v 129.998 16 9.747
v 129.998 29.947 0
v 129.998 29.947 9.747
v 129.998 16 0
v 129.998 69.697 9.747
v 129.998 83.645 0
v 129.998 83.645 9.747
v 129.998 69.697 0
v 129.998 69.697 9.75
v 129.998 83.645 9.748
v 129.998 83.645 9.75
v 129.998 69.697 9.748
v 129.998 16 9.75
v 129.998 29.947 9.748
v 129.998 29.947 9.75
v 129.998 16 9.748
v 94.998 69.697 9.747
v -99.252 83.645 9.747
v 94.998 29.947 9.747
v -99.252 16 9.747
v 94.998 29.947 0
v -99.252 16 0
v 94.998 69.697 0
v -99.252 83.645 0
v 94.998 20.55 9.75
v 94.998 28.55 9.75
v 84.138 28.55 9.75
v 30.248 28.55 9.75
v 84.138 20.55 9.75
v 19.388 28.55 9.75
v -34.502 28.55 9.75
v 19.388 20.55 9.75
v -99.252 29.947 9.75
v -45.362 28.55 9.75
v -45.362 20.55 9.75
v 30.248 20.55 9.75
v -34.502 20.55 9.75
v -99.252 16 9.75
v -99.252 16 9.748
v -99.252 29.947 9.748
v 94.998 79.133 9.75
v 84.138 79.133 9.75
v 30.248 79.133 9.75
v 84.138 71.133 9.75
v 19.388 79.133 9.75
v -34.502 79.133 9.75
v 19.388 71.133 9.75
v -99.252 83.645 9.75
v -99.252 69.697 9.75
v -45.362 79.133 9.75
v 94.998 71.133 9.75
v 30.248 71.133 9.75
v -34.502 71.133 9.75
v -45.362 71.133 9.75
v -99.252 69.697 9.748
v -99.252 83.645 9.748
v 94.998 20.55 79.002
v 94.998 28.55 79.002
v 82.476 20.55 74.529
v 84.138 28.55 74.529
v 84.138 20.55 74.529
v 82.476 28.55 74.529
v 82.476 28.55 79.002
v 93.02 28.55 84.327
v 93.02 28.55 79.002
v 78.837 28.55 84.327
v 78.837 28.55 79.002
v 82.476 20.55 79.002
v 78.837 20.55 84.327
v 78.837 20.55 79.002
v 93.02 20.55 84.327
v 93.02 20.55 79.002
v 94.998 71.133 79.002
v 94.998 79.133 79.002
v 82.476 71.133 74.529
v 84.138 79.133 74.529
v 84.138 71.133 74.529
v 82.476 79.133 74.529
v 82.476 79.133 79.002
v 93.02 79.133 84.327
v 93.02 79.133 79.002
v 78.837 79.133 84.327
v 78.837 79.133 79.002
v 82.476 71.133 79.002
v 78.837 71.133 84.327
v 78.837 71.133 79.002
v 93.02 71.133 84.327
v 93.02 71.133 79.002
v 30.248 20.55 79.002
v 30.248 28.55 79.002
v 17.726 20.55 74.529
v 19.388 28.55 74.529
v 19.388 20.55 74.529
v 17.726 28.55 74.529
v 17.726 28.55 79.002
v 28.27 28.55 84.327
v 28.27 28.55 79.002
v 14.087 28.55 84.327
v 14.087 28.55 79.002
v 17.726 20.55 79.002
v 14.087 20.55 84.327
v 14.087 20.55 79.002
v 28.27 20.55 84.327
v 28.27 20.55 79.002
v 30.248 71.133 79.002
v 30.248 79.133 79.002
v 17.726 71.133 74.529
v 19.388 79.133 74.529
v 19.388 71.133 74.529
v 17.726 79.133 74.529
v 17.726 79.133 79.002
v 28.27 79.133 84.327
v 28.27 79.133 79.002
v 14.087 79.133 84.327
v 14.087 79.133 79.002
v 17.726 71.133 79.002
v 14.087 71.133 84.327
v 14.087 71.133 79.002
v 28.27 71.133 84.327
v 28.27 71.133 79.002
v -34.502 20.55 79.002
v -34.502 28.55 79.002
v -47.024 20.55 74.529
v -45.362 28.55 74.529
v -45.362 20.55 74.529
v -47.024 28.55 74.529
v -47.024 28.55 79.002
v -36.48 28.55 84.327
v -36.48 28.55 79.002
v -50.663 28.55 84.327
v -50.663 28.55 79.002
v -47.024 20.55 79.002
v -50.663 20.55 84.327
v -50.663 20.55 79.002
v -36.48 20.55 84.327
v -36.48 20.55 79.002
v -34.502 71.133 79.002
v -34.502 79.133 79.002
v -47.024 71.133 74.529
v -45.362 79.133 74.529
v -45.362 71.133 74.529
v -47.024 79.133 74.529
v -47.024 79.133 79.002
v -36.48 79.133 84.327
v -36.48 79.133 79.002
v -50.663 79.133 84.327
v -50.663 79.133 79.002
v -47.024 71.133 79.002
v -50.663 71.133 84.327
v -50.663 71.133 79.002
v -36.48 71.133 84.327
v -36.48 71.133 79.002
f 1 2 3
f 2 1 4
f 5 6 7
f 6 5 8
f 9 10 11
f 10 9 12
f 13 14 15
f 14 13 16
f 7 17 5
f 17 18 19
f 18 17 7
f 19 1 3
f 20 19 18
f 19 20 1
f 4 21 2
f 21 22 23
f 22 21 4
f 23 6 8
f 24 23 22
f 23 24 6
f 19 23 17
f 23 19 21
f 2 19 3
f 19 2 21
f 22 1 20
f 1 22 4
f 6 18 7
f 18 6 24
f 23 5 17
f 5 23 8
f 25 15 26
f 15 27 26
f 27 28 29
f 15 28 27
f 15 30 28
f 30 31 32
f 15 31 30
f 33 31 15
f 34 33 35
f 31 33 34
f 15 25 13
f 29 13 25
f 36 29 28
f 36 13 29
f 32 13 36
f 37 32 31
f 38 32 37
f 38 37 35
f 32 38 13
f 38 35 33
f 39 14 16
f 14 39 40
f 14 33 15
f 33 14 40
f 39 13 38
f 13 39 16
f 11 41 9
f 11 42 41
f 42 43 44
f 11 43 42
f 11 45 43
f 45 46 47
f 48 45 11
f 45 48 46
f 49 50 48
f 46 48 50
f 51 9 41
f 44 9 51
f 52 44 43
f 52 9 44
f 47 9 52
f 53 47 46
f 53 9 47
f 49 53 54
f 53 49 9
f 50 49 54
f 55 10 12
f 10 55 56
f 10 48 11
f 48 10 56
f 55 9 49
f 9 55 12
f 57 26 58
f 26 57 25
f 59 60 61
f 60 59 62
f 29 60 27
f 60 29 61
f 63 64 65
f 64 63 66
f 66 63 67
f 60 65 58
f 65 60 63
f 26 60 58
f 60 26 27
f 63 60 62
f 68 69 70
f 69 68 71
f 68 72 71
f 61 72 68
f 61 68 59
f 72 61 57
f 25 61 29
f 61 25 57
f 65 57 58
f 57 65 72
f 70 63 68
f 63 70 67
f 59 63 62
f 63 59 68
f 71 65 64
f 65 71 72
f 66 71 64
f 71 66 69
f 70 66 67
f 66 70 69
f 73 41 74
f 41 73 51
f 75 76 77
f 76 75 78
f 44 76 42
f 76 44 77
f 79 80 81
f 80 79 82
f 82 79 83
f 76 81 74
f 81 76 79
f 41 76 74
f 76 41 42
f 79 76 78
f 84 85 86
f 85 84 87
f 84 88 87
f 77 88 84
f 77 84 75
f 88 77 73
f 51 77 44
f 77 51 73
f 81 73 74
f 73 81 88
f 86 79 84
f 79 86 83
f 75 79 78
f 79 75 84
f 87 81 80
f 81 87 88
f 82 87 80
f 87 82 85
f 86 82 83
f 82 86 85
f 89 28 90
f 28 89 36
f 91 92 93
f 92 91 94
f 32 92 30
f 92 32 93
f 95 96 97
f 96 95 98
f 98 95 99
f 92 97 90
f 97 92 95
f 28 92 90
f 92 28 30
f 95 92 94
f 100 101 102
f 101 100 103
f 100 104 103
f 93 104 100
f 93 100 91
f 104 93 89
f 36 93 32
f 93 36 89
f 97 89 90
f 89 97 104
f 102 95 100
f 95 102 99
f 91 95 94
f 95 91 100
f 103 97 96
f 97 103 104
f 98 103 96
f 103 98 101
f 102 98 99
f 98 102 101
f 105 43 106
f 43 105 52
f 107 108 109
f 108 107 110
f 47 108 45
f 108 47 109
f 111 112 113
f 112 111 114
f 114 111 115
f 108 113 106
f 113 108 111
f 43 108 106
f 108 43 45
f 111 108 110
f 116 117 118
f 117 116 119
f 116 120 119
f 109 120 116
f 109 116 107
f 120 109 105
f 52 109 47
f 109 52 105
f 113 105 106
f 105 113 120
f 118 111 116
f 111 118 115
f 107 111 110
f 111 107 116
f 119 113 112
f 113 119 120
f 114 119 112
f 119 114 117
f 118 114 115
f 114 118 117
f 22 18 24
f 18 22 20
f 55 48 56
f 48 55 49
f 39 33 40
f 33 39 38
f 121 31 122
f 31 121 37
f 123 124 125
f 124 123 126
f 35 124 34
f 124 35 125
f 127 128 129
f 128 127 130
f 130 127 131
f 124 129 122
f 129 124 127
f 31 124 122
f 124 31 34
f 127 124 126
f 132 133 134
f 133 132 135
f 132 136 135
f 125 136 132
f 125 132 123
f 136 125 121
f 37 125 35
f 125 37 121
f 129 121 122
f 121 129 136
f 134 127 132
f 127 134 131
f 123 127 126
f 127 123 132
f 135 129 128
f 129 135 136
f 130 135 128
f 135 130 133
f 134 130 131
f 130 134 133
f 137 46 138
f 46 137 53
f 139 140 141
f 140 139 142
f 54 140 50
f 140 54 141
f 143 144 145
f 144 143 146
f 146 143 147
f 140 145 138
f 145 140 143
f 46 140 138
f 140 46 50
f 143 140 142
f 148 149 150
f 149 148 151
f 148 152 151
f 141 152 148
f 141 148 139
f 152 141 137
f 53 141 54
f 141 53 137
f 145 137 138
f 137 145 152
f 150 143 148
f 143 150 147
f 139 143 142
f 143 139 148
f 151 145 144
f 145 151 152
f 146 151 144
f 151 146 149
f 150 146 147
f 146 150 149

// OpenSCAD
// Parameterized version of top_rect_cubes_simplified_jay.scad
// Parameters (edit these):
//   width:    overall X width (right side shifts)
//   length:   overall Y depth (scales from front face)
//   arm_gap:  gap in Y between the two arms (overrides the scaled gap)
//
// Knob-centering behavior:
// - Features in the mid-band (the small "knobs" on the large planes) stay centered
//   between the arms when arm_gap changes (they shift by half the gap delta).
//
// Identity check (matches the source geometry exactly) when:
//   width  = 252.997994;
//   length = 59.644998;
//   arm_gap = 31.750000;


pair_spacing = 64.750000;   // X spacing between tower *pairs* (right-edge to right-edge)
tower_width  = 10.860001;    // X width of a tower (main body width at the base)
tower_length = 8; // Y length of a tower
tower_height = 74.577000;   // Overall Z height of a tower (from z=9.75 to the top)
tower_y_offset = 4.55;


width   = 252.997994;
length  = 59.644998;
arm_gap = 39.750000;

// --- Reference constants (from source file) ---
_x_min      = -123.000008;
_x_split    = 94.997986;
_width_orig = 252.997994;

// Y reference landmarks (original)
// front arm ends at _y_front_end, back arm starts at _y_back_start.
// mid-band corresponds to the small "knobs" on the large planes.
_y_min           = 15.999999;
_y_front_end     = 29.946999;
_y_mid_band_start = 42.919998;
_y_mid_band_end   = 48.919998;
_y_back_start    = 61.696999;
_y_max           = 75.644997;
_length_orig     = 59.644998;
_arm_gap_orig    = 31.750000;

// --- Mapping functions ---
// X: shift the right side to hit the desired width
function map_x(x) = (x < _x_split) ? x : (x + (width - _width_orig));

// Y: first scale overall length from the front face, then shift the back-arm region
// to achieve the requested arm_gap. Mid-band features shift by half the gap delta.
function scale_y(y) = _y_min + (y - _y_min) * (length / _length_orig);

function _front_end_s() = scale_y(_y_front_end);
function _back_start_s() = scale_y(_y_back_start);
function _mid_start_s() = scale_y(_y_mid_band_start);
function _mid_end_s()   = scale_y(_y_mid_band_end);

function _gap_scaled() = _back_start_s() - _front_end_s();
function _gap_delta()  = arm_gap - _gap_scaled();

function map_y(y) =
  let(
    y0 = scale_y(y),
    bs = _back_start_s(),
    ms = _mid_start_s(),
    me = _mid_end_s(),
    dg = _gap_delta()
  )
  (y0 < bs)
    ? ((y0 >= ms && y0 <= me) ? (y0 + dg/2) : y0)
    : (y0 + dg);

module rect_prism_m(x1,y1,x2,y2,z0,h){
  translate([map_x(x1), map_y(y1), z0])
    cube([map_x(x2)-map_x(x1), map_y(y2)-map_y(y1), h], center=false);
}

// --- Tower parameterization helpers ---
// The original towers are made from 3 stacked prisms. We build the raw geometry
// in "original coordinates" (pre map_x/map_y), then scale it to match the user
// parameters while keeping the tower's right edge, front/back start, and base Z fixed.

_tower_z0_orig = 9.750000;
_tower_h_orig  = 74.577000;  // (79.001600+5.325400) - 9.750000

_tower_main_w_orig = 8.860001; // 94.997986 - 86.137985

_tower_front_y0_orig = 15.999999;
_tower_front_len_orig = 13.919999; // 29.919998 - 15.999999

_tower_back_y0_orig = 61.919998;
_tower_back_len_orig = 13.724999;  // 75.644997 - 61.919998

// X offsets from a tower's right edge (x_right) that define the 3 stacked prisms
_tower_main_dx0 = _tower_main_w_orig;         // main: x_right - dx0 .. x_right
_tower_mid_dx0  = 10.215522;                  // mid:  x_right - dx0 .. x_right
_tower_top_dx0  = 13.185022;                  // top:  x_right - dx0 .. (x_right - dx1)
_tower_top_dx1  = 1.613744;

module _tower_raw(x_right, y0, y_len) {
  union() {
    // main body
    rect_prism_m(x_right - _tower_main_dx0, y0, x_right, y0 + y_len, _tower_z0_orig, 64.779);
    // mid cap
    rect_prism_m(x_right - _tower_mid_dx0,  y0, x_right, y0 + y_len, 74.529000, 4.4726);
    // top cap (slightly inset on the right)
    rect_prism_m(x_right - _tower_top_dx0,  y0, x_right - _tower_top_dx1, y0 + y_len, 79.001600, 5.3254);
  }
}

module tower_scaled(x_right, y0, y_len_orig, y_len_target) {
  // Scale about (x_right, y0, _tower_z0_orig) so the tower stays "attached"
  // to the same base and its right edge stays aligned.
  sx = tower_width / _tower_main_w_orig;
  sy = y_len_target / y_len_orig;
  sz = tower_height / _tower_h_orig;

  translate([x_right, tower_y_offset + y0, _tower_z0_orig])
    scale([sx, sy, sz])
      translate([-x_right, -y0, -_tower_z0_orig])
        _tower_raw(x_right, y0, y_len_orig);
}

module tower_pair(x_right) {
  tower_scaled(x_right, _tower_front_y0_orig, _tower_front_len_orig, tower_length);
  tower_scaled(x_right, _tower_back_y0_orig,  _tower_back_len_orig,  tower_length);
}



// --- Section controls ---
// Four section templates exist (0..3). Each template is a left-to-right slice of the design
// and contains *two towers* (front + back) plus its mid-band features.
//
// To remove/reorder/repeat sections, edit these:
section_sequence = [0,1,2,3,4];           // templates per slot: 0=base-only, 1=rightmost towers, ..., 4=leftmost towers
section_show     = [true,true,true,true,false]; // per-slot visibility (same length as section_sequence)

_section_centers = [-73.682014, -18.932015, 35.817985, 90.567986];
_section_pitch_orig = 54.750000;
_section_pitch = pair_spacing;

function slot_center(slot) = _section_centers[0] + slot*_section_pitch;
function template_center(idx) = _section_centers[idx];

module section_by_index(idx) {
  if (idx==0) section_0();
  else if (idx==1) section_1();
  else if (idx==2) section_2();
  else if (idx==3) section_3();
  else assert(false, str("Invalid section index: ", idx));
}

module place_section(slot, idx) {
  // Translate template idx into slot position so spacing stays consistent
  translate([slot_center(slot) - template_center(idx), 0, 0]) section_by_index(idx);
}

module sections() {
  // Base segments are defined by the right edges of the tower pairs, plus the overall base bounds.
  // Sections (slots) run from the RIGHT side toward the LEFT:
  //   slot 0: base_x_max -> right edge of rightmost towers (no towers by default)
  //   slot 1: rightmost tower edge -> next tower edge
  //   slot 2: next -> next
  //   slot 3: next -> next
  //   slot 4: leftmost tower edge -> base_x_min
  //
  // Template ids (section_sequence):
  //   0 = base-only (no towers)
  //   1 = section_3 (rightmost towers)
  //   2 = section_2
  //   3 = section_1
  //   4 = section_0 (leftmost towers)

  for (slot = [0 : len(section_sequence)-1]) {
    if (slot < len(section_show) && section_show[slot]) {
      // Base under this section
      base_segment_for_slot(slot);

      // Section content (towers/knobs/etc) for this slot
      translate([template_shift_x(section_sequence[slot]), 0, 0]) place_template(section_sequence[slot]);
    }
  }
}

// --- Base segment clipping (per slot) ---
_base_x_max_orig = 129.997986;
_base_x_min_orig = -123.000008;
// Right edges of each tower-pair.
// Keep the *template* geometry at the original pitch, then move whole templates
// by template_shift_x() so changing pair_spacing doesn't double-apply.
_tower_right_edge0_orig = 94.997986;
_tower_right_edges_template = [
  _tower_right_edge0_orig,
  _tower_right_edge0_orig - 1*_section_pitch_orig,
  _tower_right_edge0_orig - 2*_section_pitch_orig,
  _tower_right_edge0_orig - 3*_section_pitch_orig
];

// Actual (placed) right-edges after spacing adjustment.
function tower_right_edge_placed(i) = _tower_right_edge0_orig - i*pair_spacing;

// Compute how far left the towers extend (so the base can stretch under them).
_tower_dx_max_orig = _tower_top_dx0; // widest left overhang in the source tower stack
function _tower_dx_max_scaled() = _tower_dx_max_orig * (tower_width / _tower_main_w_orig);
function _base_x_min_dyn() =
  min(
    _base_x_min_orig,
    min([ for (i=[0:3]) tower_right_edge_placed(i) - _tower_dx_max_scaled() ])
  );

function slot_x_hi_orig(slot) =
  (slot == 0) ? _base_x_max_orig :
  (slot == 1) ? tower_right_edge_placed(0) :
  (slot == 2) ? tower_right_edge_placed(1) :
  (slot == 3) ? tower_right_edge_placed(2) :
  (slot == 4) ? tower_right_edge_placed(3) :
  _base_x_min_dyn();

function slot_x_lo_orig(slot) =
  (slot == 0) ? tower_right_edge_placed(0) :
  (slot == 1) ? tower_right_edge_placed(1) :
  (slot == 2) ? tower_right_edge_placed(2) :
  (slot == 3) ? tower_right_edge_placed(3) :
  (slot == 4) ? _base_x_min_dyn() :
  _base_x_min_dyn();

module base_segment_for_slot(slot) {
  // Clip the common base planes into the slot's X-range.
  // Use mapped X coordinates so width parameterization stays consistent.
  x_hi = map_x(slot_x_hi_orig(slot));
  x_lo = map_x(slot_x_lo_orig(slot));
  x0 = min(x_lo, x_hi);
  x1 = max(x_lo, x_hi);
  w  = max(0.001, x1 - x0);

  intersection() {
    base_planes();
    // Big clip box in Y/Z; base is near y~[16..76], z~[0..~20], so this safely covers it.
    translate([x0, -1000, -1000]) cube([w, 2000, 2000], center=false);
  }
}


// --- X spacing adjustment for tower pairs ---
// pair_spacing changes the X distance between tower pairs. The rightmost pair stays fixed;
// pairs to the left shift by multiples of (pair_spacing - _section_pitch_orig).
function pair_index_from_tid(tid) =
  (tid == 1) ? 0 :
  (tid == 2) ? 1 :
  (tid == 3) ? 2 :
  (tid == 4) ? 3 :
  0;

function template_shift_x(tid) =
  -pair_index_from_tid(tid) * (pair_spacing - _section_pitch_orig);


// --- Template dispatcher ---
module place_template(tid) {
  if (tid == 0) {
    // base-only
  } else if (tid == 1) {
    section_3();
  } else if (tid == 2) {
    section_2();
  } else if (tid == 3) {
    section_1();
  } else if (tid == 4) {
    section_0();
  } else {
    // Unknown template id: render nothing
  }
}


// --- Base planes (common to all sections) ---
module base_planes() {
  bxmin = _base_x_min_dyn();
  union() {
    rect_prism_m(94.997986,15.999999,129.997986,29.946999,0.000000,9.747);
    // Main slab stretches in X so it always stays under the (moved) towers.
    rect_prism_m(bxmin,15.999999,94.997986,75.644997,0.000000,9.747);
    rect_prism_m(94.997986,61.696999,129.997986,75.644997,0.000000,9.747);
    rect_prism_m(bxmin,15.999999,129.997986,29.946999,9.748000,0.002);
    rect_prism_m(bxmin,61.696999,129.997986,75.644997,9.748000,0.002);
  }
}

module section_0() {
  tower_pair(_tower_right_edges_template[3]);
}

module section_1() {
  tower_pair(_tower_right_edges_template[2]);
}

module section_2() {
  tower_pair(_tower_right_edges_template[1]);
}

module section_3() {
  tower_pair(_tower_right_edges_template[0]);
}

// --- Final assembly ---
module top() {
  union() {
    //base_planes();
    sections();
  }
}

top();
